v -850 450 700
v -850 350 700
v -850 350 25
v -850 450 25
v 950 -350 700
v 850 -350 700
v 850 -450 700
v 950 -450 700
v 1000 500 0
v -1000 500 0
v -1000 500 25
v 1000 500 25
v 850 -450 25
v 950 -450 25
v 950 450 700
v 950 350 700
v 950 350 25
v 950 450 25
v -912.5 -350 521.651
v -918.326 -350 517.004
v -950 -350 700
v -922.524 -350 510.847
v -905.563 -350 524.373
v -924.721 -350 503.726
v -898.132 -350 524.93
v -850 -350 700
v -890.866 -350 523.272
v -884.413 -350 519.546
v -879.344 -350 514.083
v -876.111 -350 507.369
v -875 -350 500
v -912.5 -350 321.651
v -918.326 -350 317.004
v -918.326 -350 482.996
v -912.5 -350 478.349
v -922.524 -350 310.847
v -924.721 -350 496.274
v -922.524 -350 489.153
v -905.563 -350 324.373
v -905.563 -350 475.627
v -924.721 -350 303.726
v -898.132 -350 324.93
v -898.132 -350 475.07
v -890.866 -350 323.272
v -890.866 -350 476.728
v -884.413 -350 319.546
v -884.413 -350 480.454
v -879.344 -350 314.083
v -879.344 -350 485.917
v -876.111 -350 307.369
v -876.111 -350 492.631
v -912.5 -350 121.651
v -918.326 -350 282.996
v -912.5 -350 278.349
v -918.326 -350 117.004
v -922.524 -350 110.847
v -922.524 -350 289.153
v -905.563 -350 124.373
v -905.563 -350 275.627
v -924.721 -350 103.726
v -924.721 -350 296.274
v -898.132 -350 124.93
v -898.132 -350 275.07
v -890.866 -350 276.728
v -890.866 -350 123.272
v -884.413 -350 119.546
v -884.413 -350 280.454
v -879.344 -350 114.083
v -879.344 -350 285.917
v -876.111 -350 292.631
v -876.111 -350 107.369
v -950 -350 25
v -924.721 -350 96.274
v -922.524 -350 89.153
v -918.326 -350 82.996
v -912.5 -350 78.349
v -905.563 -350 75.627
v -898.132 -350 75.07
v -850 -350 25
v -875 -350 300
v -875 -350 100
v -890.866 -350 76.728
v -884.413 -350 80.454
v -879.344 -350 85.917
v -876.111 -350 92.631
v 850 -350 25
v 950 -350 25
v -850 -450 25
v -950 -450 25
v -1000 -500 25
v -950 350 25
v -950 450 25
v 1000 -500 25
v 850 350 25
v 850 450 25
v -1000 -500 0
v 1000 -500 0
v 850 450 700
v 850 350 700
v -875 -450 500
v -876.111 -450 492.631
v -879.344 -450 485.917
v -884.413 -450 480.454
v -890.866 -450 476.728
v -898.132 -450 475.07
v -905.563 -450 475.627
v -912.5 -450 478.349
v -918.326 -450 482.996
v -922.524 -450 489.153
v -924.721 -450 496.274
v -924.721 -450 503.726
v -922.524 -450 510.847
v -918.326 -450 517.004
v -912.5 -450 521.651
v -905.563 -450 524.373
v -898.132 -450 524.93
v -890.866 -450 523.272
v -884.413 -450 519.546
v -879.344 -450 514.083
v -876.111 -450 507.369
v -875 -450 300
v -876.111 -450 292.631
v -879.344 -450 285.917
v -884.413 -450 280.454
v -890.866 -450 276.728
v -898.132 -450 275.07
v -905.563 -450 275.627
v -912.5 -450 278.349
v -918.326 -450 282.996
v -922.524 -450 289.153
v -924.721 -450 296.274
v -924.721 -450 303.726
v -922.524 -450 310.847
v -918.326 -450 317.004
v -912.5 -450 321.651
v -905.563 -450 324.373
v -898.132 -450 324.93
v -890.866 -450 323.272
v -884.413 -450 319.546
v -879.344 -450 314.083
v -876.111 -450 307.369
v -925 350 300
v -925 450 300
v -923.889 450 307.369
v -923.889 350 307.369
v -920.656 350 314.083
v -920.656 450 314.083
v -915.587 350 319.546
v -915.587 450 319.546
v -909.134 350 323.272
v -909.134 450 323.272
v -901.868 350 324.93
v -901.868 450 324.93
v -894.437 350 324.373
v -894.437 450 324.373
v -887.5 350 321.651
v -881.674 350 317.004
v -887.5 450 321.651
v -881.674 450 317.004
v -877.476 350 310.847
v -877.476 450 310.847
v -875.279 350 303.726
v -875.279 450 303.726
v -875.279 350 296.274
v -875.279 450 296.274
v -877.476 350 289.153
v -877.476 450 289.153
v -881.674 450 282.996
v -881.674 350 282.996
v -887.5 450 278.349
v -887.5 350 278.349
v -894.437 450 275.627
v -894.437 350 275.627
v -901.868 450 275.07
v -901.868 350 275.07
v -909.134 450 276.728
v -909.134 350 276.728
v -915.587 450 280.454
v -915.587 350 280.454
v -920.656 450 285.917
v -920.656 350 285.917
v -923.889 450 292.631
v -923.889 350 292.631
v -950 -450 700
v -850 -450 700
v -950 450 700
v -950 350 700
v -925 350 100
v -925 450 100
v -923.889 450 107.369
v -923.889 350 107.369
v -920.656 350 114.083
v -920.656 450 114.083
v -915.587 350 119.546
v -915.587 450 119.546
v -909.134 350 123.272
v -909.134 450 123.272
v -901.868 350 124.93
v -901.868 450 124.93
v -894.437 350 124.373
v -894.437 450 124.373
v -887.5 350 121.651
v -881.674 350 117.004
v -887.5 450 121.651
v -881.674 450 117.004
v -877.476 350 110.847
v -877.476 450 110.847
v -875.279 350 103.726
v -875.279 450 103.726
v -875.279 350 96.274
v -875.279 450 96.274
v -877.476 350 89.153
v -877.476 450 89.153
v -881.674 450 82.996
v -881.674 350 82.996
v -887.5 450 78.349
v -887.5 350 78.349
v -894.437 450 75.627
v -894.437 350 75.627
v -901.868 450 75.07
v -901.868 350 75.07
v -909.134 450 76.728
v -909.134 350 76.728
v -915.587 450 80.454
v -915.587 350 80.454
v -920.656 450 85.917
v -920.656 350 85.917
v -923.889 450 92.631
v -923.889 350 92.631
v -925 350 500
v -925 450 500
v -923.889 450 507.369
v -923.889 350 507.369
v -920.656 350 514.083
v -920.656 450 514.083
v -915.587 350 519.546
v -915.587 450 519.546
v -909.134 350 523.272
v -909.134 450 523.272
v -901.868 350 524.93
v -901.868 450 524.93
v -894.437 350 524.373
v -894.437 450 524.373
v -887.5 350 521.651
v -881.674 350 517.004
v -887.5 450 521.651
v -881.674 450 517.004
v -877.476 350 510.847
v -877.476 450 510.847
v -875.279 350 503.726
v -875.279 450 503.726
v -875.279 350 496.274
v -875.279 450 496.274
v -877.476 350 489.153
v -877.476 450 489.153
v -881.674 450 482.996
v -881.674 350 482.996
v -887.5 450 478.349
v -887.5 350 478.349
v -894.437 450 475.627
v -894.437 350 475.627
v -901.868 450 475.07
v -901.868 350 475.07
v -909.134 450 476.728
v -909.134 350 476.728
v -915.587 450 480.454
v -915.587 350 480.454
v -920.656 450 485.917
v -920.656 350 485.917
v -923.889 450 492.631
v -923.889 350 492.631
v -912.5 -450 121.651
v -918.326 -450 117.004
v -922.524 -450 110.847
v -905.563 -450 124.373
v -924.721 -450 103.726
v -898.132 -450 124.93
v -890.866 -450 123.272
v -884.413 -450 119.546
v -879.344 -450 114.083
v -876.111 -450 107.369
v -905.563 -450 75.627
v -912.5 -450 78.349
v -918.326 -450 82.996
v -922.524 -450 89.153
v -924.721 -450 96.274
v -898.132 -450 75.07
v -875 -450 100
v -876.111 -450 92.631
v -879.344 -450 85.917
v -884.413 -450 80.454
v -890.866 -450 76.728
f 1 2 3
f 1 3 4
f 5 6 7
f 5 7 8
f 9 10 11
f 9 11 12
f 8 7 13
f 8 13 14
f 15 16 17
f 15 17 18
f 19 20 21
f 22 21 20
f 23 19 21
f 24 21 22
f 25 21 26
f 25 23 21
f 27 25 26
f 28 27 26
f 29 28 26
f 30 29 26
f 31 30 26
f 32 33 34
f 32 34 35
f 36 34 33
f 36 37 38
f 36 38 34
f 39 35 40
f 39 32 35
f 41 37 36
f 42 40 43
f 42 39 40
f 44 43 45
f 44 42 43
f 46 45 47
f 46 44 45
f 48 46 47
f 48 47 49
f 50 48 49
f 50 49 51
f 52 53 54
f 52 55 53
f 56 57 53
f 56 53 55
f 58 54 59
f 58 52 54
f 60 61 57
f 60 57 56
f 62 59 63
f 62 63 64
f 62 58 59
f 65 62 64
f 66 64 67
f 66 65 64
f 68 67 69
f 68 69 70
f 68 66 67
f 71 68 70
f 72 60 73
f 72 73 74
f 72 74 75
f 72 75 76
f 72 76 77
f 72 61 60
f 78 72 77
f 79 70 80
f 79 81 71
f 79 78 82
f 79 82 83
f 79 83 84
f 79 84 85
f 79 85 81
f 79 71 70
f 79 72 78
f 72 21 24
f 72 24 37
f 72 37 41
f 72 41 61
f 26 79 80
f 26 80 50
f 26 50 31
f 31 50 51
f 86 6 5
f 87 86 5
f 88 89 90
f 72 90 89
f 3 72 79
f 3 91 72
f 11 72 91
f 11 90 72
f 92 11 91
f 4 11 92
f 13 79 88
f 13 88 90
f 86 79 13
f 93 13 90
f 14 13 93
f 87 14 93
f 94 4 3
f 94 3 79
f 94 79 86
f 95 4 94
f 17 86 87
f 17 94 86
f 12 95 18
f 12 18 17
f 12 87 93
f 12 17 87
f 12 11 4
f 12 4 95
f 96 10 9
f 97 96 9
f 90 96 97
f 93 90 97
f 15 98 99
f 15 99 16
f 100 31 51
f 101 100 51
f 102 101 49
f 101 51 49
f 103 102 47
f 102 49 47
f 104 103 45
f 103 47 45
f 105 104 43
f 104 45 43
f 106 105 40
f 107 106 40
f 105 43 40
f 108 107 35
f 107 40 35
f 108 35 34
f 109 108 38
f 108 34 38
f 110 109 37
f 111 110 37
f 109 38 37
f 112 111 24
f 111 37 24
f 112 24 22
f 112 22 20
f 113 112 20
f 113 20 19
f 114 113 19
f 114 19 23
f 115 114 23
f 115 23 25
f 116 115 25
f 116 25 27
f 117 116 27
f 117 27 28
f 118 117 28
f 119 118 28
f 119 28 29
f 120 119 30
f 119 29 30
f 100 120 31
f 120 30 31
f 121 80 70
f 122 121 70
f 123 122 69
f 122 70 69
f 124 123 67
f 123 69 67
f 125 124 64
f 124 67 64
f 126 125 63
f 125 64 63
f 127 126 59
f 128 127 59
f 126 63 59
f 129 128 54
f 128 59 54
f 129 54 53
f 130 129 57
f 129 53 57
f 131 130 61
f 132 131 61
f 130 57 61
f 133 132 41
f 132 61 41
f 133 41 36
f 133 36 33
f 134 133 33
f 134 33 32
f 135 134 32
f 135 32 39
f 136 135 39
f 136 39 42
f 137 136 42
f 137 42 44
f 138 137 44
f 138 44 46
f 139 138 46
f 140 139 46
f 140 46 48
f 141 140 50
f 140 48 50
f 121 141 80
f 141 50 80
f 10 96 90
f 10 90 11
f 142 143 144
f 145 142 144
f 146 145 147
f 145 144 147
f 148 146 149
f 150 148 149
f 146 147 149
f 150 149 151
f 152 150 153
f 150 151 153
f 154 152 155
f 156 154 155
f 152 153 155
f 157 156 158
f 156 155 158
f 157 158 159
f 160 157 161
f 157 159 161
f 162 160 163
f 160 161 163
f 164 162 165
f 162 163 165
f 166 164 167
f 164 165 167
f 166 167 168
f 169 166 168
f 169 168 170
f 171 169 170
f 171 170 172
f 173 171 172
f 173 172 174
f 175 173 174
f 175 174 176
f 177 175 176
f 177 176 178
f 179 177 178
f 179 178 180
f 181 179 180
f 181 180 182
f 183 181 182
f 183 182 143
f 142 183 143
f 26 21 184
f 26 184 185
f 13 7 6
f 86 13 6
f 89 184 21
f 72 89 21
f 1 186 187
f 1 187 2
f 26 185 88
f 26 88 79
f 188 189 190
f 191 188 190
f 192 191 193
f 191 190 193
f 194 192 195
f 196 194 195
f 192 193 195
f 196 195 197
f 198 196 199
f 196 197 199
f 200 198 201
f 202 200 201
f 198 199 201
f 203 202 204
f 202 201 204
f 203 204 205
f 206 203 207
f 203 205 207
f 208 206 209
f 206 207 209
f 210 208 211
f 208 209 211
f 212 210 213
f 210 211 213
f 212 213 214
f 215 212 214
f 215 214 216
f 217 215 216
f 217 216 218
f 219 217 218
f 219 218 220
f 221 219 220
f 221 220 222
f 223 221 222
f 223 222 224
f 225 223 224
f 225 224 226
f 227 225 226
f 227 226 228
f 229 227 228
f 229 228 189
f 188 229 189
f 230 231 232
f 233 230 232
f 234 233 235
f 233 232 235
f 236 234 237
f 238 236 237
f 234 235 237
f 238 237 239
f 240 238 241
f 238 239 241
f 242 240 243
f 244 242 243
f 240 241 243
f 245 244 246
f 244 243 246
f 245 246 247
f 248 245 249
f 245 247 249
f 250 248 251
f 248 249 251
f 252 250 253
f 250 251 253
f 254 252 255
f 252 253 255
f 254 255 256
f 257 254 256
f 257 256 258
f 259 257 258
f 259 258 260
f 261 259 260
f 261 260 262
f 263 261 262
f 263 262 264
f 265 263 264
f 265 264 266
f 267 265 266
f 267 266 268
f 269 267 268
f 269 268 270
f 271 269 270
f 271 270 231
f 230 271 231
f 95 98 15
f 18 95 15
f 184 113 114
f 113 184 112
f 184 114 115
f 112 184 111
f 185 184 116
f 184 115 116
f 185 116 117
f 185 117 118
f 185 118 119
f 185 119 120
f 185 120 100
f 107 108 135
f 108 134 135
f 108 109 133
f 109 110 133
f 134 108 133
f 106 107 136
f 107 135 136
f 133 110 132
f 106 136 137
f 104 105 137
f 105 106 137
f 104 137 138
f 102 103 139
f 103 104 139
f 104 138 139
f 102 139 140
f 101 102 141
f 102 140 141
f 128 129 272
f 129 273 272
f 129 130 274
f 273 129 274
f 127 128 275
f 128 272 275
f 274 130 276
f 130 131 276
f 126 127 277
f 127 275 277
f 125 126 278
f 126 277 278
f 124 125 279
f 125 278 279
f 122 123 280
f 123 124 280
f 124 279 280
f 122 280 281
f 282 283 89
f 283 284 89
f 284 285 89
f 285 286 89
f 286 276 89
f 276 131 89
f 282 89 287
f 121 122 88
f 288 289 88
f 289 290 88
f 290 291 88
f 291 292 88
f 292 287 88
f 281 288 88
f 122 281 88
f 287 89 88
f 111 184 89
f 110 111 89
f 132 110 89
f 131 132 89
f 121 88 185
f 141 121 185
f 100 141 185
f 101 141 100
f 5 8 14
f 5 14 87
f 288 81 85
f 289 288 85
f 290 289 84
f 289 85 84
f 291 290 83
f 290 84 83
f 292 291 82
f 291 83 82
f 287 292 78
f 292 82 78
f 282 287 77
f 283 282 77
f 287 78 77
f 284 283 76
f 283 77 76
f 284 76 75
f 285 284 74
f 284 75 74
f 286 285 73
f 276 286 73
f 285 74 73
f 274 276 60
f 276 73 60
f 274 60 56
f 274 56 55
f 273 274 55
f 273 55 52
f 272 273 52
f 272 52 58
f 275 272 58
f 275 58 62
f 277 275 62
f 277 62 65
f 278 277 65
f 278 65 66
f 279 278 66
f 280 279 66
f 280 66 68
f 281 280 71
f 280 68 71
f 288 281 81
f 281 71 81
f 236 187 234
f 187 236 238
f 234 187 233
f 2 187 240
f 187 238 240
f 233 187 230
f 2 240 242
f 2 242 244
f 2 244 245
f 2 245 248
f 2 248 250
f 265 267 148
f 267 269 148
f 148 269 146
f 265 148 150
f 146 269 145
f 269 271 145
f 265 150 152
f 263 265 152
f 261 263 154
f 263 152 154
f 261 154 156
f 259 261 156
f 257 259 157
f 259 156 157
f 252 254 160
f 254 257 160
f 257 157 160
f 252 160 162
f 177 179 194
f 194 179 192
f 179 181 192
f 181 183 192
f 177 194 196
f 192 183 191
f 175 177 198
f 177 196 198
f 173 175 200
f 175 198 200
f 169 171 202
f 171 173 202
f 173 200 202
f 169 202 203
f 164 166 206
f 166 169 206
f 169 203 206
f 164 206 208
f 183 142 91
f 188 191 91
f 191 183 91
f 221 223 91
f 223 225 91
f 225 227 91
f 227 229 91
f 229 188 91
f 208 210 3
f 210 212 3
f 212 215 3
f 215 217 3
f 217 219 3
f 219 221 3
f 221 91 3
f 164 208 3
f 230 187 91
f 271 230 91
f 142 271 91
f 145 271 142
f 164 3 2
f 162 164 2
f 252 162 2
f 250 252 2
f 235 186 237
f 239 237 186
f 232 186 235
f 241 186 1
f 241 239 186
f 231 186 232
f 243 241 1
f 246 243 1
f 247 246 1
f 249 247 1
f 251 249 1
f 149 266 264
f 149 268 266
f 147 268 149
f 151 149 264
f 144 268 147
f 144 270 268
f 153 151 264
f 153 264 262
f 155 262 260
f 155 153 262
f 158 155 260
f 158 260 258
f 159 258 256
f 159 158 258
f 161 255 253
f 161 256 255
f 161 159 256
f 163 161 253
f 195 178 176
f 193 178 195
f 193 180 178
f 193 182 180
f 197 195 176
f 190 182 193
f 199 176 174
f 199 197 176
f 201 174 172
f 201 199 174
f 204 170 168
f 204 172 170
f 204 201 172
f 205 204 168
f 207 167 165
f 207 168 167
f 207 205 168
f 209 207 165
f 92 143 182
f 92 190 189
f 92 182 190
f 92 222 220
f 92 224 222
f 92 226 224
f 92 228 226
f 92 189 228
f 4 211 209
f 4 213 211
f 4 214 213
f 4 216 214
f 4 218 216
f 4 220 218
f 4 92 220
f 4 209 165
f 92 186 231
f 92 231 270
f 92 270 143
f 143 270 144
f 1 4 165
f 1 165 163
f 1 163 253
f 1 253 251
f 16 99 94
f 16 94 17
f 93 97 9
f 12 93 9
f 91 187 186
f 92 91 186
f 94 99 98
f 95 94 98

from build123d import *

# Parameters (mm, degrees)
F0_W     = 2000
F0_H     = 1000
F1_DEPTH = 25
F2_W     = 100
F2_H     = 100
F3_DEPTH = 700
F5_D     = 50
F5_DEPTH = 500.001
F6_D     = 50


with BuildPart() as f1:
    # F0 (on Top) → F1 (new body)
    with BuildSketch(Plane.XY):
        Rectangle(F0_W, F0_H)
    extrude(amount=F1_DEPTH)

    # F2 (on Top) → F3 (join)
    with BuildSketch(Plane.XY):
        with Locations((-900, 400)):
            Rectangle(F2_W, F2_H)
        with Locations((-900, -400)):
            Rectangle(F2_W, F2_H)
        with Locations((900, 400)):
            Rectangle(F2_W, F2_H)
        with Locations((900, -400)):
            Rectangle(F2_W, F2_H)
    extrude(amount=F3_DEPTH)

    # F5 (through all, one way)
    with BuildSketch(Plane(origin=(0, 0, 0), x_dir=(1, 0, 0), z_dir=(0, 1, 0))):
        with Locations((-900, -500), (-900, -300), (-900, -100)):
            Circle(F5_D / 2)
    extrude(amount=-F5_DEPTH, mode=Mode.SUBTRACT)

    # F6 (through all)
    with Locations(Plane.XZ):
        with Locations((-900, 300), (-900, 500), (-900, 100)):
            Hole(F6_D / 2)


solid = f1.part
